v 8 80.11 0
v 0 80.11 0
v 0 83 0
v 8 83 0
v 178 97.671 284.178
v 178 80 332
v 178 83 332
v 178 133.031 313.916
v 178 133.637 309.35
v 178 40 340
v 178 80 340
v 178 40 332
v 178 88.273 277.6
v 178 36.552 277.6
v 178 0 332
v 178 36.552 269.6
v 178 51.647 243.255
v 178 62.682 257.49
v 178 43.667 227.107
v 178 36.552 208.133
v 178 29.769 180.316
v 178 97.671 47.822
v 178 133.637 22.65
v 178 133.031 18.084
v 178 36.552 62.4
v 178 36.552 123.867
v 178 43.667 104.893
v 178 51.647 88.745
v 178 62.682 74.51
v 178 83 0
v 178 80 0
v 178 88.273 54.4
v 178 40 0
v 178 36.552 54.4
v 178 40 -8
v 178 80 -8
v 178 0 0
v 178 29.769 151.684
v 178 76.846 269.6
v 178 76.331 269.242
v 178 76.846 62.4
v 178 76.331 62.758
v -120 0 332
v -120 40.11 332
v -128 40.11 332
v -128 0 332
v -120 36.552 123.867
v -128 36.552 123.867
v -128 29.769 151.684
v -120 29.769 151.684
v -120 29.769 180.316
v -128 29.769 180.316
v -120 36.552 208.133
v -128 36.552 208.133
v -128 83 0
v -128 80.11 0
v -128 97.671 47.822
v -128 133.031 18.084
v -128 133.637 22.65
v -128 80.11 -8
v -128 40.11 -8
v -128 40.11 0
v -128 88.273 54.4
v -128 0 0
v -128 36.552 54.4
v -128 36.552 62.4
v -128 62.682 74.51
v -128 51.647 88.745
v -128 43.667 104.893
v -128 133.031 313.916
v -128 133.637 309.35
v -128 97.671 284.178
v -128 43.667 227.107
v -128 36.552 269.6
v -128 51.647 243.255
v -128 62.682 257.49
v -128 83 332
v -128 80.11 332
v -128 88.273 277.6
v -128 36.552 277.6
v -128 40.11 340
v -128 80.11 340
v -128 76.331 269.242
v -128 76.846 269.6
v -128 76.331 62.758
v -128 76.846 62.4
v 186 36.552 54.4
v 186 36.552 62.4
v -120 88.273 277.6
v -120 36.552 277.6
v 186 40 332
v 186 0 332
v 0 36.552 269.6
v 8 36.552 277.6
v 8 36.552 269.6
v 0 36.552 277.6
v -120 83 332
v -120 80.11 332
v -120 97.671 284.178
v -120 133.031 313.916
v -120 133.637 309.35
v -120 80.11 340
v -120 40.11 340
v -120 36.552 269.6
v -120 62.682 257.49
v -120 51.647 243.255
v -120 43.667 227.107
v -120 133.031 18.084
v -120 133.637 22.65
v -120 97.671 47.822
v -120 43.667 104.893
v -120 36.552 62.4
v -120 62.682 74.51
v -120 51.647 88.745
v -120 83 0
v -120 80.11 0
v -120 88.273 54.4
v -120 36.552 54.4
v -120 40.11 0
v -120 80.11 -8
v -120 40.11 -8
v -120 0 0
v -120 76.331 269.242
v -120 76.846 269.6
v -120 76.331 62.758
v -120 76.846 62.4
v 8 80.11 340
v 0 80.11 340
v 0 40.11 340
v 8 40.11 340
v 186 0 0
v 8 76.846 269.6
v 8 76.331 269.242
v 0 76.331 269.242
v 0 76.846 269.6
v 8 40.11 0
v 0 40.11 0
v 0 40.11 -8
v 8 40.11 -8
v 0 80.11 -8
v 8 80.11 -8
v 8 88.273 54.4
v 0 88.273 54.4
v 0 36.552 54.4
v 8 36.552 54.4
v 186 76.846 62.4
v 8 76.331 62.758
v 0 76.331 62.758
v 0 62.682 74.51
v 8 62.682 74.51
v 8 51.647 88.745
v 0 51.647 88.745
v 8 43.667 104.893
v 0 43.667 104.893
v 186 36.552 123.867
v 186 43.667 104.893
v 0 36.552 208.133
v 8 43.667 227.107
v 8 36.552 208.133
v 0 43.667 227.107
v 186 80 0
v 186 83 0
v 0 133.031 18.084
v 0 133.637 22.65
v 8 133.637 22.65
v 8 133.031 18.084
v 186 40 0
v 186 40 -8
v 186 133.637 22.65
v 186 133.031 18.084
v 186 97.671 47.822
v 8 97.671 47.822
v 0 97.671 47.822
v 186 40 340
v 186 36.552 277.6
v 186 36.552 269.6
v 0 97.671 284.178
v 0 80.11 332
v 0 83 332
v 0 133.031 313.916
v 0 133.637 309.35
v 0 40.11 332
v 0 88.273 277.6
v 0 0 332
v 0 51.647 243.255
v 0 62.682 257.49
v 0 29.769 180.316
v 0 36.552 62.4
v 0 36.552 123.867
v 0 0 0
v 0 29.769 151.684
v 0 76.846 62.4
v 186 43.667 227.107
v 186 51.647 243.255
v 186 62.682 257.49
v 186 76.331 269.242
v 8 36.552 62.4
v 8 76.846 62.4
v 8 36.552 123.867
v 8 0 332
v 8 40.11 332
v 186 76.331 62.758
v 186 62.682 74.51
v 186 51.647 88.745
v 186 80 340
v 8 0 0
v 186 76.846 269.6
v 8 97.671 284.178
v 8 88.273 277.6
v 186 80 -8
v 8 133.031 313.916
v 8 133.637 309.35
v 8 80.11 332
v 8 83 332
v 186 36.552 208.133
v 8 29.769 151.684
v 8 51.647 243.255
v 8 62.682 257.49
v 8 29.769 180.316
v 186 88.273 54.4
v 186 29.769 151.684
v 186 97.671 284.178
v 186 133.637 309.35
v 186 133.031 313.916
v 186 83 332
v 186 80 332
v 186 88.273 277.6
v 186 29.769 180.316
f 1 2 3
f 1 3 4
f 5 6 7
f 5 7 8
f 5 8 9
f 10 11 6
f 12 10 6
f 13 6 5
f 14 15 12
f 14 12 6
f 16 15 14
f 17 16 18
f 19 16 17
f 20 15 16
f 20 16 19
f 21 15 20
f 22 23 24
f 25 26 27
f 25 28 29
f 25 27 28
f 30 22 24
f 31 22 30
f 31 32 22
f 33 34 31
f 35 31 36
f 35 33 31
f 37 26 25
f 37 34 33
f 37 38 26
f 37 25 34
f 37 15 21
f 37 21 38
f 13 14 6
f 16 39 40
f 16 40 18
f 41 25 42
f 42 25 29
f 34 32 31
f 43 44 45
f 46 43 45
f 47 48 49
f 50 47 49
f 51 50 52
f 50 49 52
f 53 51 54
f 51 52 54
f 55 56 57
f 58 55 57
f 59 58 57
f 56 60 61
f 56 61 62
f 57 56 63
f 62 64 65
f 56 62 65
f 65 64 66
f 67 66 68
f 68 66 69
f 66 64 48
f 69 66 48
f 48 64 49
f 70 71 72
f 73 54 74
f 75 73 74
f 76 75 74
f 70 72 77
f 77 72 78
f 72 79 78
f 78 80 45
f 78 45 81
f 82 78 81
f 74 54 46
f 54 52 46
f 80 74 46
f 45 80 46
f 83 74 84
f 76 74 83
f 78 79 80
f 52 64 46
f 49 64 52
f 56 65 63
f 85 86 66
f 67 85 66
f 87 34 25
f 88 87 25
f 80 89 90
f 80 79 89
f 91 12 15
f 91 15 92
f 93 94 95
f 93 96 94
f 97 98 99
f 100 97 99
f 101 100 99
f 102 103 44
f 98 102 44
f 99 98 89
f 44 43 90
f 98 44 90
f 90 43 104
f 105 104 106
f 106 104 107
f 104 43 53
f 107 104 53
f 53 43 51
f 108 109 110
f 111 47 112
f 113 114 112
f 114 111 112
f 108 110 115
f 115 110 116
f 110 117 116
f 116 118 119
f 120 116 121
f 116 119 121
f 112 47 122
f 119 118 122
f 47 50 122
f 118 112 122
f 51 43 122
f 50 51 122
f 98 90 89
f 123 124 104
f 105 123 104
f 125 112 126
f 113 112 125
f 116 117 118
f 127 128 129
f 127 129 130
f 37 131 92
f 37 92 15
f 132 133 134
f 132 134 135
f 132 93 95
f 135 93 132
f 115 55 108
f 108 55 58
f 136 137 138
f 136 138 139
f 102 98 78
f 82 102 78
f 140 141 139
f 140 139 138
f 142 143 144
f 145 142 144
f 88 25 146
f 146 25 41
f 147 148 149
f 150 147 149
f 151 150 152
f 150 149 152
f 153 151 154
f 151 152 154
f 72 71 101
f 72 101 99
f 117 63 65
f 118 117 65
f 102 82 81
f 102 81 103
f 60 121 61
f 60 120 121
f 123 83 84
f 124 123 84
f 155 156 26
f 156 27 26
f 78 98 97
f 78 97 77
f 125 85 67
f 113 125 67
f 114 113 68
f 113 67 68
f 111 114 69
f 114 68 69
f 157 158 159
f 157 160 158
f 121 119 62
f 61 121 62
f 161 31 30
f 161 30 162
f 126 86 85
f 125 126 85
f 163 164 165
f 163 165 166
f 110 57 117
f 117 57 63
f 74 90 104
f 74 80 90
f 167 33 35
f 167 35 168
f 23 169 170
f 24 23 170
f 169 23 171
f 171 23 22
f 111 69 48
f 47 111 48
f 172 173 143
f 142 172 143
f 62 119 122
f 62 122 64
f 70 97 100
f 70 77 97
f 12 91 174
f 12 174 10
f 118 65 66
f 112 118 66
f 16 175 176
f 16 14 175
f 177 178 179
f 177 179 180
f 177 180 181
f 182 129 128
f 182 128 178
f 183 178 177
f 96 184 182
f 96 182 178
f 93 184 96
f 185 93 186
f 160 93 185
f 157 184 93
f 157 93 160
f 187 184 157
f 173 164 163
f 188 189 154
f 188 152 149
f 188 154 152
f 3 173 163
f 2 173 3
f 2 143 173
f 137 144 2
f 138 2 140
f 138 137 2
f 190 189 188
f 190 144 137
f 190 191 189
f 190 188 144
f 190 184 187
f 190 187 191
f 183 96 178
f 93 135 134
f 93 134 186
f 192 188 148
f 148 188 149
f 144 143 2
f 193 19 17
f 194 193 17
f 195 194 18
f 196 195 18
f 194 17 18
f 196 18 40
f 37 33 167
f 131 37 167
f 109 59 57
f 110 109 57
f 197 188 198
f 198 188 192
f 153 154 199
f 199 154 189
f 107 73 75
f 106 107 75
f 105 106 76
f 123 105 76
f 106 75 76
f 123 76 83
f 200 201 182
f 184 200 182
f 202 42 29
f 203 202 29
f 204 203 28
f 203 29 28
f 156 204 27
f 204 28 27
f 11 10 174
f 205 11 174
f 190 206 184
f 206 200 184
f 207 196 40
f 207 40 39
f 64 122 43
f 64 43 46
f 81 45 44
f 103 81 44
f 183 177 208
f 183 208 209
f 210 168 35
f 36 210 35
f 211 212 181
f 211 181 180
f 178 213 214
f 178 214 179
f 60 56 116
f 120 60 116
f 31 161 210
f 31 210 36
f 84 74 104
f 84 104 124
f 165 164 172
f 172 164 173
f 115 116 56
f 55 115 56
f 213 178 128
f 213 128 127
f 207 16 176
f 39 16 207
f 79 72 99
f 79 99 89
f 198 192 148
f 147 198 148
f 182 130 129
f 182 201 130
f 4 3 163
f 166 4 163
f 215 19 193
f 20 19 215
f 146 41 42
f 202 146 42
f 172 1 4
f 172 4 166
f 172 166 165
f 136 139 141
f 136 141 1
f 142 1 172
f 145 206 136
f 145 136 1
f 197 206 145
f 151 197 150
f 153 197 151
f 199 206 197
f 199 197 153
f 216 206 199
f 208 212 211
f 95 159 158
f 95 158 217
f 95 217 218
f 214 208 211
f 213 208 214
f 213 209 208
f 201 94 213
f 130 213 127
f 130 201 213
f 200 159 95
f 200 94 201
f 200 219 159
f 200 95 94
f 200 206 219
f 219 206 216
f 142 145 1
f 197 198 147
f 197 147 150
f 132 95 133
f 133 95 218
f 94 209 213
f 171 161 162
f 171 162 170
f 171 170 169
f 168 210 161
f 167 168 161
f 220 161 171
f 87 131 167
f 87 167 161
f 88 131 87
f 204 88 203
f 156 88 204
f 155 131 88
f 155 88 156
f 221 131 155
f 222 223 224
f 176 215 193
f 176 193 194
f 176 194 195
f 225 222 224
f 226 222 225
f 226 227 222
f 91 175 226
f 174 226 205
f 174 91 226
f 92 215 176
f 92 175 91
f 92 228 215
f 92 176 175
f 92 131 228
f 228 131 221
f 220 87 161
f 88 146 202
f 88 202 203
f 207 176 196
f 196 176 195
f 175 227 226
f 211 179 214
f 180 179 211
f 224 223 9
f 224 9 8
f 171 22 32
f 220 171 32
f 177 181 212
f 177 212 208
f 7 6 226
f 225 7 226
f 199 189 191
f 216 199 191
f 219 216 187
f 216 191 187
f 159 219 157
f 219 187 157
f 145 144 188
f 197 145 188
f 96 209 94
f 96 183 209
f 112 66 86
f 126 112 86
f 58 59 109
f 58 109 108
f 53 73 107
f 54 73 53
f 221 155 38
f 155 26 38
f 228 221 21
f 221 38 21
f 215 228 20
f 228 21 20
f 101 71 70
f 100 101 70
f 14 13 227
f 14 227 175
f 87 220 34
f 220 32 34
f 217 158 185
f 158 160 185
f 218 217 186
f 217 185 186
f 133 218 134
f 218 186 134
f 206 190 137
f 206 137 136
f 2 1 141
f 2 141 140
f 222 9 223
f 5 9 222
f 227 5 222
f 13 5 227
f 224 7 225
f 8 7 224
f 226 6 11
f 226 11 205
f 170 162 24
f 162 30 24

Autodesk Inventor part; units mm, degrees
ref_plane "YZ Plane" through (0, 0, 0) normal (1, 0, 0) x (0, 1, 0)
ref_plane "XZ Plane" through (0, 0, 0) normal (0, 1, 0) x (-1, 0, 0)
sketch "Эскиз1" plane through (0, 0, 0) normal (0, 1, 0) x (-1, 0, 0)
  line L0 (-8, 0) -> (-8, 332)
  line L1 (-8, 332) -> (2, 332)
  line L2 (-8, 0) -> (-178, 0) construction
  line L3 (-178, 332) -> (-187.2412, 332)
  line L4 (-168, 0) -> (-178, 0)
  line L5 (2, 332) -> (0, 332)
  line L6 (0, 332) -> (0, 0)
  line L7 (120, 332) -> (120, 0)
  line L8 (0, 0) -> (-8, 0)
  line L9 (-168, 0) -> (-186, 0)
  line L10 (-186, 0) -> (-186, 332)
  line L11 (-186, 332) -> (-187.2412, 332)
  line L12 (-178, 332) -> (-178, 0)
  line L13 (128, 0) -> (128, 332)
  line L14 (120, 0) -> (128, 0)
  line L15 (120, 332) -> (128, 332)
  point P0 (0, 0)
  point P1 (-166, 0)
  point P2 (-178, 0)
  dimension "d1" = 332
  dimension "d2" = 170
  dimension "d18" = 8
  dimension "d25" = 8
  dimension "d26" = 120
  dimension "d27" = 8
  dimension "d28" = 0
extrude "Выдавливание1" add sketch "Эскиз1" along normal blind 166
sketch "Эскиз2" plane through (-130, 0, 0) normal (-1, 0, 0) x (0, 0, 1)
  line L0 (0, 0) -> (0, 166) construction
  line L1 (332, 0) -> (332, 166) construction
  line L2 (0, 166) -> (166, 166) construction
  circle A0 centre (166, 166) radius 136 construction
  line L3 (104.8926, 43.667) -> (123.8668, 36.552)
  line L4 (227.1074, 43.667) -> (208.1332, 36.552)
  arc A1 (123.8668, 36.552) -> (208.1332, 36.552) centre (166, 148.9121) ccw
  line L5 (0, 166) -> (332, 166) construction
  line L6 (22.6502, 133.6372) -> (54.5783, 88.0179)
  line L7 (54.5783, 88.0179) -> (62.7576, 76.3313)
  line L8 (0, 83) -> (18.0836, 133.0313)
  arc A2 (62.7576, 76.3313) -> (104.8926, 43.667) centre (136.4925, 127.9371) ccw
  line L9 (22.6502, 133.6372) -> (18.0836, 133.0313)
  line L10 (166, 166) -> (166, 148.9121) construction
  line L11 (309.3498, 133.6372) -> (277.4217, 88.0179)
  line L12 (277.4217, 88.0179) -> (269.2424, 76.3313)
  line L13 (332, 83) -> (313.9164, 133.0313)
  arc A3 (227.1074, 43.667) -> (269.2424, 76.3313) centre (195.5075, 127.9371) ccw
  line L14 (309.3498, 133.6372) -> (313.9164, 133.0313)
  line L15 (332, 83) -> (332, 166)
  line L16 (332, 166) -> (0, 166)
  line L17 (0, 166) -> (0, 83)
  point P0 (19.7832, 137.7335)
  dimension "d10" = 272
  dimension "d11" = 120
  dimension "d12" = 90
  dimension "d13" = 5
  dimension "d14" = 5
ref_plane "РабПлоскость1" through (0, 0, 166) normal (0, 0, 1) x (1, 0, 0)
sketch "Эскиз4" plane through (-128, 0, 0) normal (-1, 0, 0) x (0, 0, 1)
  line L0 (0, 0) -> (0, 166) construction
  line L1 (332, 0) -> (332, 166) construction
  line L2 (0, 166) -> (166, 166) construction
  arc A0 (277.6, 88.2733) -> (213.751, 38.6585) centre (166, 166) ccw construction
  line L3 (104.8926, 43.667) -> (123.8668, 36.552)
  line L4 (227.1074, 43.667) -> (208.1332, 36.552)
  arc A1 (123.8668, 36.552) -> (208.1332, 36.552) centre (166, 148.9121) ccw
  line L5 (0, 166) -> (332, 166) construction
  line L6 (22.6502, 133.6372) -> (47.822, 97.6714)
  line L7 (0, 83) -> (18.0836, 133.0313)
  arc A2 (62.7576, 76.3313) -> (104.8926, 43.667) centre (136.4925, 127.9371) ccw
  line L8 (22.6502, 133.6372) -> (18.0836, 133.0313)
  line L9 (166, 166) -> (166, 148.9121) construction
  line L10 (309.3498, 133.6372) -> (284.178, 97.6714)
  line L11 (332, 83) -> (313.9164, 133.0313)
  line L12 (309.3498, 133.6372) -> (313.9164, 133.0313)
  arc A3 (227.1074, 43.667) -> (269.2424, 76.3313) centre (195.5075, 127.9371) ccw
  line L13 (332, 83) -> (332, 166)
  line L14 (332, 166) -> (0, 166)
  line L15 (0, 166) -> (0, 83)
  line L16 (54.4, 106.4464) -> (54.4, 143.4464) projected
  line L17 (54.4, 88.2733) -> (54.4, 36.552)
  line L18 (54.4, 36.552) -> (62.4, 36.552)
  line L19 (62.4, 36.552) -> (62.4, 76.846)
  line L20 (47.822, 97.6714) -> (54.4, 88.2733)
  line L21 (62.4, 76.846) -> (62.7576, 76.3313)
  line L22 (277.6, 88.2733) -> (277.6, 36.552)
  line L23 (277.6, 36.552) -> (269.6, 36.552)
  line L24 (269.6, 36.552) -> (269.6, 76.846)
  line L25 (269.2424, 76.3313) -> (269.6, 76.846)
  line L26 (284.178, 97.6714) -> (277.6, 88.2733)
  point P0 (0, 0)
  point P1 (54.5783, 88.0179)
  point P2 (19.7832, 137.7335)
  point P3 (277.4217, 88.0179)
  point P4 (283.0312, 96.0329)
  point P5 (48.9688, 96.0329)
  dimension "d29" = 272
  dimension "d30" = 120
  dimension "d31" = 90
  dimension "d32" = 5
  dimension "d33" = 5
  dimension "d46" = 2
  dimension "d50" = 2
  dimension "d53" = 8
  dimension "d54" = 90
extrude "Выдавливание4" cut sketch "Эскиз4" against normal through all
sketch "Эскиз5" plane through (178, 0, 332) normal (0, 0, 1) x (1, 0, 0)
  line L0 (39.2204, 40) -> (-44.3448, 40) construction
  line L1 (39.2204, 0) -> (-44.3448, 0) construction
  line L2 (8, 0) -> (8, 83) projected
  line L3 (8, 40) -> (0, 40)
  line L4 (0, 40) -> (0, 80)
  line L5 (0, 80) -> (8, 80)
  line L6 (8, 80) -> (8, 40)
  line L7 (-44.3448, 40) -> (-315.6542, 40) construction
  line L8 (-170, 36.552) -> (-170, 43.667) projected
  line L9 (-178, 133.6372) -> (-178, 97.6714) projected
  line L10 (-170, 40.1095) -> (-178, 40.1095)
  line L11 (-178, 40.1095) -> (-178, 80.1095)
  line L12 (-178, 80.1095) -> (-170, 80.1095)
  line L13 (-170, 80.1095) -> (-170, 40.1095)
  line L14 (-306, 36.552) -> (-306, 43.667) projected
  line L15 (-298, 0) -> (-298, 83) projected
  line L16 (-306, 40.1095) -> (-298, 40.1095)
  line L17 (-298, 40.1095) -> (-298, 80.1095)
  line L18 (-298, 80.1095) -> (-306, 80.1095)
  line L19 (-306, 80.1095) -> (-306, 40.1095)
  point P0 (-178, 0)
  point P1 (-178, 76.3313)
  point P2 (-178, 76.3313)
  dimension "d36" = 40
  dimension "d37" = 8
  dimension "d38" = 40
  dimension "d39" = 40
extrude "Выдавливание5" add sketch "Эскиз5" along normal blind 8
mirror "Зеркальное отражение2" about plane through (0, 0, 166) normal (0, 0, 1) of "Выдавливание5"
equation "\"d14\" = d13"
equation "\"d33\" = d32"
equation "\"d46\" = d45"
equation "\"d50\" = d49"
equation "\"d45\" = d43"
equation "\"d49\" = d43"
equation "\"d43\" = 2"
properties part number "dno"
